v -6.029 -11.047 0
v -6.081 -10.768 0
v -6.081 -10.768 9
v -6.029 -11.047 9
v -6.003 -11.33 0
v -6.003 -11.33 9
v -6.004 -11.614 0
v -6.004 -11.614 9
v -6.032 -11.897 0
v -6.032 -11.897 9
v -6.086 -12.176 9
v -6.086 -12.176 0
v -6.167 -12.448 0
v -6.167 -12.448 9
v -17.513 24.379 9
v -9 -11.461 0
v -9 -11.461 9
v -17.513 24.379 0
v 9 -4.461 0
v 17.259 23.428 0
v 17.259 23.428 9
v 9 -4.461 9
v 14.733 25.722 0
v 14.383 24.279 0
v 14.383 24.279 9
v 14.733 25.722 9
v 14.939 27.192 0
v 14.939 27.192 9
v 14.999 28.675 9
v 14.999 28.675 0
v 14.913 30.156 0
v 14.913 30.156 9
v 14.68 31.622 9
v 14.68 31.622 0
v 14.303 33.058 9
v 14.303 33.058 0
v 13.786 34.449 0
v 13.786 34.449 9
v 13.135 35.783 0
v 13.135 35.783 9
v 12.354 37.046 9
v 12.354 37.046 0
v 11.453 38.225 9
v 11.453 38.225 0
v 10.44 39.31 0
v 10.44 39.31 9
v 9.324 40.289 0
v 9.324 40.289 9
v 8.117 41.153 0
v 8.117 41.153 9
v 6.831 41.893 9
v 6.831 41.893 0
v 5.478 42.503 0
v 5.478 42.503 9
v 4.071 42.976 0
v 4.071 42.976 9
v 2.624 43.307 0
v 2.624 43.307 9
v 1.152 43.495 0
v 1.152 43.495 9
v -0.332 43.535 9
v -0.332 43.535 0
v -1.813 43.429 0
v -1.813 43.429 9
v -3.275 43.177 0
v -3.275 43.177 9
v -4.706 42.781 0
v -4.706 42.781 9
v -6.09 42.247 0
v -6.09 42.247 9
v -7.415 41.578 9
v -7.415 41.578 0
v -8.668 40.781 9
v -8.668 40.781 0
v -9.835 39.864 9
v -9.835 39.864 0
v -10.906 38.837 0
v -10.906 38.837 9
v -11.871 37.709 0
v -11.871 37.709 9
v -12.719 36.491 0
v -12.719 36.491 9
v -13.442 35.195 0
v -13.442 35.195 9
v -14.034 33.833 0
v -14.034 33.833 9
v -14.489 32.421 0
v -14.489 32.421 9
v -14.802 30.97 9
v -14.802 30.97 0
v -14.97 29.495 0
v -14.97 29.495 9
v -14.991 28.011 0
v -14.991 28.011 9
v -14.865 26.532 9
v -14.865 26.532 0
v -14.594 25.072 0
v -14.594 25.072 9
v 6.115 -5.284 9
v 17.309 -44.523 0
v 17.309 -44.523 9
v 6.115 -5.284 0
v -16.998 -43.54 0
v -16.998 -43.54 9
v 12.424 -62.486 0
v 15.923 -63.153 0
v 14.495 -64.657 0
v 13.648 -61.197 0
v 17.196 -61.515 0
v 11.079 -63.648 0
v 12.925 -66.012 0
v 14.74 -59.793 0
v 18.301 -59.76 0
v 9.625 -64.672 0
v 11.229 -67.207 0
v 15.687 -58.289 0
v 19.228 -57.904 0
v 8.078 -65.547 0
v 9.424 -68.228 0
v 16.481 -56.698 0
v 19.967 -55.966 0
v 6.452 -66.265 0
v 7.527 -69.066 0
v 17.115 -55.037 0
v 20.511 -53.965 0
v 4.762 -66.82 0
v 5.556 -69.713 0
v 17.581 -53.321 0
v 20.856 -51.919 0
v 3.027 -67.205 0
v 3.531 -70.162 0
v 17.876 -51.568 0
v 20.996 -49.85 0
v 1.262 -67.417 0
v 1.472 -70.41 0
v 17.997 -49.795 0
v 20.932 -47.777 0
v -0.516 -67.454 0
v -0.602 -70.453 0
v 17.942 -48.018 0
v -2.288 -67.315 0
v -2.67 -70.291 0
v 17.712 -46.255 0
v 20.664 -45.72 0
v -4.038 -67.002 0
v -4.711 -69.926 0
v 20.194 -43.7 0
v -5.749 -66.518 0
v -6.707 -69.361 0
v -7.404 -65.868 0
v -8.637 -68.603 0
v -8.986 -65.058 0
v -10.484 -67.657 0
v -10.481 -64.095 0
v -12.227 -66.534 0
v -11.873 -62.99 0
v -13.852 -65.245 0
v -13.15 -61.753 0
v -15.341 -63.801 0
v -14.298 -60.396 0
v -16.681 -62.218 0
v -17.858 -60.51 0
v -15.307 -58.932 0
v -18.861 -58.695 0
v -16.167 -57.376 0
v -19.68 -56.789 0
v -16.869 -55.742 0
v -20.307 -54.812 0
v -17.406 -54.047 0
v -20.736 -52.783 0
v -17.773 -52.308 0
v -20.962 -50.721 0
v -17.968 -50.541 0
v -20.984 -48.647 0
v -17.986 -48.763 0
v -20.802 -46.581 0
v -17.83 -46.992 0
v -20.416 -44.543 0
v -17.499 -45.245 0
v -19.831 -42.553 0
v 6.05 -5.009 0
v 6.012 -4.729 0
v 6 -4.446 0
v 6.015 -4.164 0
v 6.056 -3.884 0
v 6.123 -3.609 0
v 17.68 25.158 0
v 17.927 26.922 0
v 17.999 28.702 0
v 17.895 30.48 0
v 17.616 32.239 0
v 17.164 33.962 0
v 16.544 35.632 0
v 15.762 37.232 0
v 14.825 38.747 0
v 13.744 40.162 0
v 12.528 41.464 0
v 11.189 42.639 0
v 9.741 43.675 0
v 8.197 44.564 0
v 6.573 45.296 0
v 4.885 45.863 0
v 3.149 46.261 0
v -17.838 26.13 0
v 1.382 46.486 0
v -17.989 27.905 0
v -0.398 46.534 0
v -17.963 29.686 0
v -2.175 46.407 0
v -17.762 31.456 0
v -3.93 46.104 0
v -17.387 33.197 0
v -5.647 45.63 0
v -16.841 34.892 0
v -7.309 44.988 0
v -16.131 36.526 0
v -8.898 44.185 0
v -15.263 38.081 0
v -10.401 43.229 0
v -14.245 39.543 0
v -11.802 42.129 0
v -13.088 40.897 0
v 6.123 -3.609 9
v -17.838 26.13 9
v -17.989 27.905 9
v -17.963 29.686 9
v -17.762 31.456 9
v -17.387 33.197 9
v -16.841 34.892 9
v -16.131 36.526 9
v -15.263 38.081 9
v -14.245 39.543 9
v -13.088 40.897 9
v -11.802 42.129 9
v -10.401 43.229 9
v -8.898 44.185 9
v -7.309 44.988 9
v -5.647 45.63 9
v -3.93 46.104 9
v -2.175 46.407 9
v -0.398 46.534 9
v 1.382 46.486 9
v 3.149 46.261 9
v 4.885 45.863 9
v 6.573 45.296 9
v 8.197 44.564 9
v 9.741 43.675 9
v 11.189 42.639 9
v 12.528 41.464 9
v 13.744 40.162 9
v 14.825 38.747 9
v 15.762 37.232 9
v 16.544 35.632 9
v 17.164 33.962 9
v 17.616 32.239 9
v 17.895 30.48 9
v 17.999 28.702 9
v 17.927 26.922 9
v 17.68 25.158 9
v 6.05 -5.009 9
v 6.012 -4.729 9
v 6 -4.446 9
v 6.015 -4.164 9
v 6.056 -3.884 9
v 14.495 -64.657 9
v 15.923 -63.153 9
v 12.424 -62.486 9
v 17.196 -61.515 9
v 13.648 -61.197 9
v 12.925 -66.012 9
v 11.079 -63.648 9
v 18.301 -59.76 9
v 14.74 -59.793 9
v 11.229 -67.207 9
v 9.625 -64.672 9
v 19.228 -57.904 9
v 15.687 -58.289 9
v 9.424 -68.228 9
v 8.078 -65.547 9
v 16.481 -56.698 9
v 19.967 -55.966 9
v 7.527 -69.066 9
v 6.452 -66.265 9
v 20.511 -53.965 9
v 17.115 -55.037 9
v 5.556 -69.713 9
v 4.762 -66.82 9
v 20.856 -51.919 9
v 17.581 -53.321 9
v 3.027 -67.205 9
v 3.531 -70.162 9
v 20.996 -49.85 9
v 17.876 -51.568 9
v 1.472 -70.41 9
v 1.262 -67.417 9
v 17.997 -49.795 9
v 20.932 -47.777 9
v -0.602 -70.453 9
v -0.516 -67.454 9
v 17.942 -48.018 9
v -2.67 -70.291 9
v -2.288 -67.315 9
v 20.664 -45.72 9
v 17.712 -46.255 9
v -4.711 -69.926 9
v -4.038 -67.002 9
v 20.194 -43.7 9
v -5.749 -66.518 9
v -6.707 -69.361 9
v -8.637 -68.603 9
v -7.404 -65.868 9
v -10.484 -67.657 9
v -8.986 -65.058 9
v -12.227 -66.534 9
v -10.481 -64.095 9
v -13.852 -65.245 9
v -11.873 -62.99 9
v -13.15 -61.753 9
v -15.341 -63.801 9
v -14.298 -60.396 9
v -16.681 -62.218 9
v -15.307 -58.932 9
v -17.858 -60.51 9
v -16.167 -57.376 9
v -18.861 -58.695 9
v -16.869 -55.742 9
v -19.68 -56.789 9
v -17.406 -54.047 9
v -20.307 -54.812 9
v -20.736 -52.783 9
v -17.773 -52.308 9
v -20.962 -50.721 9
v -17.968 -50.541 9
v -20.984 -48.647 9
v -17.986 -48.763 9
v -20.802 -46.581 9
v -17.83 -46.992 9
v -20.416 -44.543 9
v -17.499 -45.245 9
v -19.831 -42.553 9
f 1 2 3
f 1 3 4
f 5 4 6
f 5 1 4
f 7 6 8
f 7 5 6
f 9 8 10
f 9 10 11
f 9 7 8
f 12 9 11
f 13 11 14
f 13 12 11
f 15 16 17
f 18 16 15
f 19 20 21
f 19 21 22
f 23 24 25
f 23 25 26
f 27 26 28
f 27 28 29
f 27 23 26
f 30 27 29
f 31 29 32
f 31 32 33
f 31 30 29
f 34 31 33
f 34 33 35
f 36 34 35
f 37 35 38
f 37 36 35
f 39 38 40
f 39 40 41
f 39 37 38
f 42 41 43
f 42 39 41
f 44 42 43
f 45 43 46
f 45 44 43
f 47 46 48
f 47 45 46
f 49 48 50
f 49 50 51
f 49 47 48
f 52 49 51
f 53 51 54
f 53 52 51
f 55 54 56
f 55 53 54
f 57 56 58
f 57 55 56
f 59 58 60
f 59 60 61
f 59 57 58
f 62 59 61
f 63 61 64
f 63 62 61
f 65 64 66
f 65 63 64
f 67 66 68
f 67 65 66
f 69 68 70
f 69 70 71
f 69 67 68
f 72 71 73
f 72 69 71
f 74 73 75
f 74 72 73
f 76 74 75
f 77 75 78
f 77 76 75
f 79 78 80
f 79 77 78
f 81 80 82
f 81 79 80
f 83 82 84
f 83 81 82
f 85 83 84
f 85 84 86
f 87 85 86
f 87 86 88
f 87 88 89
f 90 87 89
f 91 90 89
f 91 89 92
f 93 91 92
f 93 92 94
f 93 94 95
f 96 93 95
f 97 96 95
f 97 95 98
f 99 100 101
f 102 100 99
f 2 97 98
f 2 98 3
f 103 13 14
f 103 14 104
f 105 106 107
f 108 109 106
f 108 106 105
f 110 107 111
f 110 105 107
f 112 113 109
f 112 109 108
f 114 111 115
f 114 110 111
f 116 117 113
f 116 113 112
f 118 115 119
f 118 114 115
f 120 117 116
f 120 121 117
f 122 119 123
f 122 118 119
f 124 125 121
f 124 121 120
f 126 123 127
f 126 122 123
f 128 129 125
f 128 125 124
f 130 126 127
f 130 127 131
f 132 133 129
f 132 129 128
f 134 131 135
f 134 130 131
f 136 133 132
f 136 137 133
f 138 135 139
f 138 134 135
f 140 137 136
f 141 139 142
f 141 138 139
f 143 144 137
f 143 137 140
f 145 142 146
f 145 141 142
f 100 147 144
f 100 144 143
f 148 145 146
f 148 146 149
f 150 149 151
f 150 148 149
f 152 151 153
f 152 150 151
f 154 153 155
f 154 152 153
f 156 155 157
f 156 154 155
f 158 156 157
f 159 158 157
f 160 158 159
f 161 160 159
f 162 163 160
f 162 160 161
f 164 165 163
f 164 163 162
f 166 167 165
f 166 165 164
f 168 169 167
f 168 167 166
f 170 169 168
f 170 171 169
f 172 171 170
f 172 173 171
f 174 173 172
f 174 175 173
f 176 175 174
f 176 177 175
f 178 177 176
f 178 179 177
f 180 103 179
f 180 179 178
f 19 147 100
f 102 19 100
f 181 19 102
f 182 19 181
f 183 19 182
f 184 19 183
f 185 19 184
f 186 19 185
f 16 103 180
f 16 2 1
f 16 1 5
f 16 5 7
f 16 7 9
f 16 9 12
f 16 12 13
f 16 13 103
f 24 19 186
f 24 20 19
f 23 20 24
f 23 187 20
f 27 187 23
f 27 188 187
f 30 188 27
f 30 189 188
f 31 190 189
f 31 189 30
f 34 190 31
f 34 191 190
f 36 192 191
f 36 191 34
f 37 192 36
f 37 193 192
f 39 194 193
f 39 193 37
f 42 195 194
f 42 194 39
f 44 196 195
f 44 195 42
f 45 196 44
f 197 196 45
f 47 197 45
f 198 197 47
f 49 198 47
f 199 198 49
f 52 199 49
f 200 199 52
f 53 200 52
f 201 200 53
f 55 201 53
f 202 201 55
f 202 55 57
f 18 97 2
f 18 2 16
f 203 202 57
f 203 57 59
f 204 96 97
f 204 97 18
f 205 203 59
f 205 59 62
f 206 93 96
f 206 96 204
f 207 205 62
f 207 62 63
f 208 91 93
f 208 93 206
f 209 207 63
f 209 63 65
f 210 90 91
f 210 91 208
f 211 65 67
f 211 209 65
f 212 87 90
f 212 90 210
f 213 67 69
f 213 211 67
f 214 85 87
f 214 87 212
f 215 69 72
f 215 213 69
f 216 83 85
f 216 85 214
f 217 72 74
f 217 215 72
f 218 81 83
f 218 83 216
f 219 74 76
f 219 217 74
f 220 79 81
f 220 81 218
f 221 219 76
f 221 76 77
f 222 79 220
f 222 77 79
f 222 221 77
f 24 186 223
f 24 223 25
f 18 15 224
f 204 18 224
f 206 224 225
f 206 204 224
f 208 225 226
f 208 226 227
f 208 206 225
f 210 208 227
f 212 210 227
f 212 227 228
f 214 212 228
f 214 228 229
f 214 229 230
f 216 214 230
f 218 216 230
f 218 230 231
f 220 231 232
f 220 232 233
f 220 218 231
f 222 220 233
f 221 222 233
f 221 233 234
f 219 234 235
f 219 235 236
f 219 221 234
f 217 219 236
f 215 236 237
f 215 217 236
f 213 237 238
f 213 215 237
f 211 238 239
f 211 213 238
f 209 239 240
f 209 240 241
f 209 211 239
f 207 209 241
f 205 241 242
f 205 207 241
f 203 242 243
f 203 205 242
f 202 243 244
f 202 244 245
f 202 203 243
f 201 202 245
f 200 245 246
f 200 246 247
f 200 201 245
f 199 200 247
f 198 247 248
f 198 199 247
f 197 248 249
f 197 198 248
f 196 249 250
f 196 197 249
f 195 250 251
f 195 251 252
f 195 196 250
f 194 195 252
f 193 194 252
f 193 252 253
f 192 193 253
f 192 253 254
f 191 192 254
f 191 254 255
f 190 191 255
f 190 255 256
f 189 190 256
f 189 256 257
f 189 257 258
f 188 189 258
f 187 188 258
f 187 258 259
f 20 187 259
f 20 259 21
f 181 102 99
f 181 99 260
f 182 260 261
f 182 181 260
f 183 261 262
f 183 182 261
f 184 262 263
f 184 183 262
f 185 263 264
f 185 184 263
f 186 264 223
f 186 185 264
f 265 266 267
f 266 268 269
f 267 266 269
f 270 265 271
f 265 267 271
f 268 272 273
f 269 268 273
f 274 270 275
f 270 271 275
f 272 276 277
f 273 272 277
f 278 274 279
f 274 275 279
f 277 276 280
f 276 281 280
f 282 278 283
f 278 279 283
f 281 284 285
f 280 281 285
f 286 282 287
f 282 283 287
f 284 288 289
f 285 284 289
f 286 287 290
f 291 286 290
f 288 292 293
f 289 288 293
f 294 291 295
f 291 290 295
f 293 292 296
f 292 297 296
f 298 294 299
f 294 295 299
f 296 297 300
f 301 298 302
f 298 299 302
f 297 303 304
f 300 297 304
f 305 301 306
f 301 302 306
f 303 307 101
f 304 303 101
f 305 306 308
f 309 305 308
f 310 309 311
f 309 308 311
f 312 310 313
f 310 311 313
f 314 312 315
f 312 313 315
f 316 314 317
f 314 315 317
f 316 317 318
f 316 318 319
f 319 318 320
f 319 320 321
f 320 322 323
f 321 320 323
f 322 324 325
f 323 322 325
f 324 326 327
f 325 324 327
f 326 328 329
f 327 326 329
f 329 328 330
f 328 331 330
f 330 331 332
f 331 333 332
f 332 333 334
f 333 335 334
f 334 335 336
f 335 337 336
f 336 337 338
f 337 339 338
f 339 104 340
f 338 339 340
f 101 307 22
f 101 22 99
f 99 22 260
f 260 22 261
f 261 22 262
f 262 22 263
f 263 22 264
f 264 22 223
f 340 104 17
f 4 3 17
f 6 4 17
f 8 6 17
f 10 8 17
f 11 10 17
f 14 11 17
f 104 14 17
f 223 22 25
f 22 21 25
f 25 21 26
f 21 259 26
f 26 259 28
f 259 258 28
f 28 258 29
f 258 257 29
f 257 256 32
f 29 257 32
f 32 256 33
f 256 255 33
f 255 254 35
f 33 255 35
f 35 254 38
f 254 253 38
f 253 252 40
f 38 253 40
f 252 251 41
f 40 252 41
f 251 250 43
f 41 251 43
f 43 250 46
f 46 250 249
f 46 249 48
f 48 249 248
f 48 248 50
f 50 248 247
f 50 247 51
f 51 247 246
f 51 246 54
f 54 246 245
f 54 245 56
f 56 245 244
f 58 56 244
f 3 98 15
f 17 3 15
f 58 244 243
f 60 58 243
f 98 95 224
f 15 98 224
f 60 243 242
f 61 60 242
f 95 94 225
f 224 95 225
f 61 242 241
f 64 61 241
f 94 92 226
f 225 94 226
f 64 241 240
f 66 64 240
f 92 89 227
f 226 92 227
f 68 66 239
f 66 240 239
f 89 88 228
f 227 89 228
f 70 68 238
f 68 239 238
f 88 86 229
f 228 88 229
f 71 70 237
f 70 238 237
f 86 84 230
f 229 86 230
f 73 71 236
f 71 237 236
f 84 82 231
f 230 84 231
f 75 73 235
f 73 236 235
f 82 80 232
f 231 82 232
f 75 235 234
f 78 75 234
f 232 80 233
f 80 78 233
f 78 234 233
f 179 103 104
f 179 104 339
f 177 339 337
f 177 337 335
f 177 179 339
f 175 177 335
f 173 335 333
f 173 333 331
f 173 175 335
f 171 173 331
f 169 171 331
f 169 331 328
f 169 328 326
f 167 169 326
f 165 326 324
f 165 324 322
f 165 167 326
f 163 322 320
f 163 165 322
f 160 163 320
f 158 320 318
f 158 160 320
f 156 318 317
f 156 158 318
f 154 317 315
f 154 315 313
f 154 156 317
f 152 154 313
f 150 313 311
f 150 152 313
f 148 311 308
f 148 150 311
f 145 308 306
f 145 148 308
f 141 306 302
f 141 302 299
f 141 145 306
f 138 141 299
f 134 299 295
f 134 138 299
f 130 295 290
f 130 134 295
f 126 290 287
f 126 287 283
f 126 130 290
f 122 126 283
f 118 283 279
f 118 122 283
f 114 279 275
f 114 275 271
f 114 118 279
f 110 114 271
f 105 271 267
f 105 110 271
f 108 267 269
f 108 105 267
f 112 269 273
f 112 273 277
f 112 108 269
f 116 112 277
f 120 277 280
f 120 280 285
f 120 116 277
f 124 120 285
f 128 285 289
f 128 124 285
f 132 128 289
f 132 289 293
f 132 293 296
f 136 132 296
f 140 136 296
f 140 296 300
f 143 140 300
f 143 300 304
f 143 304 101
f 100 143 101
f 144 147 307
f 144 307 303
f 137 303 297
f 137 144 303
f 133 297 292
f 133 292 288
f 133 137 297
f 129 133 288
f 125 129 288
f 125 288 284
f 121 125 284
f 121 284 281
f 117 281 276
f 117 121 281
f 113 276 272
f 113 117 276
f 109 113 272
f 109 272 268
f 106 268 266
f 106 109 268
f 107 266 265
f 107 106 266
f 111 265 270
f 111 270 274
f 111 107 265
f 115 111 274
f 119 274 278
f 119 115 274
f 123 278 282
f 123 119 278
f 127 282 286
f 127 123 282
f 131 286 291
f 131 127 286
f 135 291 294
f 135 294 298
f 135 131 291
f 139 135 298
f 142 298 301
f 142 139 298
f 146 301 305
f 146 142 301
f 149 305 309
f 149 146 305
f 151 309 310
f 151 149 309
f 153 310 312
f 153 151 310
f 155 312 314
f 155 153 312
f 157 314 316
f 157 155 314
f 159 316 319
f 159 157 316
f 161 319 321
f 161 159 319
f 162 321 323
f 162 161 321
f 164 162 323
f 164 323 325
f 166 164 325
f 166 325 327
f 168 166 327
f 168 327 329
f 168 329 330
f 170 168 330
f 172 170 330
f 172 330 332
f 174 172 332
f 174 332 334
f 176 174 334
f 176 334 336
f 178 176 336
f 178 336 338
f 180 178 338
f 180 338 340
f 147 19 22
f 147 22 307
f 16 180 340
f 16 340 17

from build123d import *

# Parameters (mm, degrees)
EXTRUDE_1_DEPTH = 9


with BuildPart() as part:
    # 草图1 → 凸台-拉伸1 (new body)
    with BuildSketch(Plane.XY):
        with BuildLine():
            Line((9, -4.461217091), (20.194287223, -43.700074535))
            ThreePointArc((20.194287223, -43.700074535), (-0.601689007, -70.452595567), (-19.831131739, -42.552800924))
            Line((-19.831131739, -42.552800924), (-9, -11.461217091))
            Line((-9, -11.461217091), (-17.512781831, 24.379158821))
            ThreePointArc((-17.512781831, 24.379158821), (0.492386715, 46.532047075), (17.259086335, 23.427624637))
            Line((17.259086335, 23.427624637), (9, -4.461217091))
        make_face()
        with BuildLine():
            Line((-14.593984859, 25.072429503), (-6.081203028, -10.767946409))
            ThreePointArc((-6.081203028, -10.767946409), (-6.003901946, -11.614176084), (-6.16698118, -12.448133686))
            Line((-6.16698118, -12.448133686), (-16.998112919, -43.539717519))
            ThreePointArc((-16.998112919, -43.539717519), (-0.515733435, -67.453827213), (17.309389049, -44.5230949))
            Line((17.309389049, -44.5230949), (6.115101825, -5.284237456))
            ThreePointArc((6.115101825, -5.284237456), (6.000037583, -4.446200468), (6.123485611, -3.609357379))
            Line((6.123485611, -3.609357379), (14.382571946, 24.279484349))
            ThreePointArc((14.382571946, 24.279484349), (0.410322262, 43.533169714), (-14.593984859, 25.072429503))
        make_face(mode=Mode.SUBTRACT)
    extrude(amount=EXTRUDE_1_DEPTH)


solid = part.part
